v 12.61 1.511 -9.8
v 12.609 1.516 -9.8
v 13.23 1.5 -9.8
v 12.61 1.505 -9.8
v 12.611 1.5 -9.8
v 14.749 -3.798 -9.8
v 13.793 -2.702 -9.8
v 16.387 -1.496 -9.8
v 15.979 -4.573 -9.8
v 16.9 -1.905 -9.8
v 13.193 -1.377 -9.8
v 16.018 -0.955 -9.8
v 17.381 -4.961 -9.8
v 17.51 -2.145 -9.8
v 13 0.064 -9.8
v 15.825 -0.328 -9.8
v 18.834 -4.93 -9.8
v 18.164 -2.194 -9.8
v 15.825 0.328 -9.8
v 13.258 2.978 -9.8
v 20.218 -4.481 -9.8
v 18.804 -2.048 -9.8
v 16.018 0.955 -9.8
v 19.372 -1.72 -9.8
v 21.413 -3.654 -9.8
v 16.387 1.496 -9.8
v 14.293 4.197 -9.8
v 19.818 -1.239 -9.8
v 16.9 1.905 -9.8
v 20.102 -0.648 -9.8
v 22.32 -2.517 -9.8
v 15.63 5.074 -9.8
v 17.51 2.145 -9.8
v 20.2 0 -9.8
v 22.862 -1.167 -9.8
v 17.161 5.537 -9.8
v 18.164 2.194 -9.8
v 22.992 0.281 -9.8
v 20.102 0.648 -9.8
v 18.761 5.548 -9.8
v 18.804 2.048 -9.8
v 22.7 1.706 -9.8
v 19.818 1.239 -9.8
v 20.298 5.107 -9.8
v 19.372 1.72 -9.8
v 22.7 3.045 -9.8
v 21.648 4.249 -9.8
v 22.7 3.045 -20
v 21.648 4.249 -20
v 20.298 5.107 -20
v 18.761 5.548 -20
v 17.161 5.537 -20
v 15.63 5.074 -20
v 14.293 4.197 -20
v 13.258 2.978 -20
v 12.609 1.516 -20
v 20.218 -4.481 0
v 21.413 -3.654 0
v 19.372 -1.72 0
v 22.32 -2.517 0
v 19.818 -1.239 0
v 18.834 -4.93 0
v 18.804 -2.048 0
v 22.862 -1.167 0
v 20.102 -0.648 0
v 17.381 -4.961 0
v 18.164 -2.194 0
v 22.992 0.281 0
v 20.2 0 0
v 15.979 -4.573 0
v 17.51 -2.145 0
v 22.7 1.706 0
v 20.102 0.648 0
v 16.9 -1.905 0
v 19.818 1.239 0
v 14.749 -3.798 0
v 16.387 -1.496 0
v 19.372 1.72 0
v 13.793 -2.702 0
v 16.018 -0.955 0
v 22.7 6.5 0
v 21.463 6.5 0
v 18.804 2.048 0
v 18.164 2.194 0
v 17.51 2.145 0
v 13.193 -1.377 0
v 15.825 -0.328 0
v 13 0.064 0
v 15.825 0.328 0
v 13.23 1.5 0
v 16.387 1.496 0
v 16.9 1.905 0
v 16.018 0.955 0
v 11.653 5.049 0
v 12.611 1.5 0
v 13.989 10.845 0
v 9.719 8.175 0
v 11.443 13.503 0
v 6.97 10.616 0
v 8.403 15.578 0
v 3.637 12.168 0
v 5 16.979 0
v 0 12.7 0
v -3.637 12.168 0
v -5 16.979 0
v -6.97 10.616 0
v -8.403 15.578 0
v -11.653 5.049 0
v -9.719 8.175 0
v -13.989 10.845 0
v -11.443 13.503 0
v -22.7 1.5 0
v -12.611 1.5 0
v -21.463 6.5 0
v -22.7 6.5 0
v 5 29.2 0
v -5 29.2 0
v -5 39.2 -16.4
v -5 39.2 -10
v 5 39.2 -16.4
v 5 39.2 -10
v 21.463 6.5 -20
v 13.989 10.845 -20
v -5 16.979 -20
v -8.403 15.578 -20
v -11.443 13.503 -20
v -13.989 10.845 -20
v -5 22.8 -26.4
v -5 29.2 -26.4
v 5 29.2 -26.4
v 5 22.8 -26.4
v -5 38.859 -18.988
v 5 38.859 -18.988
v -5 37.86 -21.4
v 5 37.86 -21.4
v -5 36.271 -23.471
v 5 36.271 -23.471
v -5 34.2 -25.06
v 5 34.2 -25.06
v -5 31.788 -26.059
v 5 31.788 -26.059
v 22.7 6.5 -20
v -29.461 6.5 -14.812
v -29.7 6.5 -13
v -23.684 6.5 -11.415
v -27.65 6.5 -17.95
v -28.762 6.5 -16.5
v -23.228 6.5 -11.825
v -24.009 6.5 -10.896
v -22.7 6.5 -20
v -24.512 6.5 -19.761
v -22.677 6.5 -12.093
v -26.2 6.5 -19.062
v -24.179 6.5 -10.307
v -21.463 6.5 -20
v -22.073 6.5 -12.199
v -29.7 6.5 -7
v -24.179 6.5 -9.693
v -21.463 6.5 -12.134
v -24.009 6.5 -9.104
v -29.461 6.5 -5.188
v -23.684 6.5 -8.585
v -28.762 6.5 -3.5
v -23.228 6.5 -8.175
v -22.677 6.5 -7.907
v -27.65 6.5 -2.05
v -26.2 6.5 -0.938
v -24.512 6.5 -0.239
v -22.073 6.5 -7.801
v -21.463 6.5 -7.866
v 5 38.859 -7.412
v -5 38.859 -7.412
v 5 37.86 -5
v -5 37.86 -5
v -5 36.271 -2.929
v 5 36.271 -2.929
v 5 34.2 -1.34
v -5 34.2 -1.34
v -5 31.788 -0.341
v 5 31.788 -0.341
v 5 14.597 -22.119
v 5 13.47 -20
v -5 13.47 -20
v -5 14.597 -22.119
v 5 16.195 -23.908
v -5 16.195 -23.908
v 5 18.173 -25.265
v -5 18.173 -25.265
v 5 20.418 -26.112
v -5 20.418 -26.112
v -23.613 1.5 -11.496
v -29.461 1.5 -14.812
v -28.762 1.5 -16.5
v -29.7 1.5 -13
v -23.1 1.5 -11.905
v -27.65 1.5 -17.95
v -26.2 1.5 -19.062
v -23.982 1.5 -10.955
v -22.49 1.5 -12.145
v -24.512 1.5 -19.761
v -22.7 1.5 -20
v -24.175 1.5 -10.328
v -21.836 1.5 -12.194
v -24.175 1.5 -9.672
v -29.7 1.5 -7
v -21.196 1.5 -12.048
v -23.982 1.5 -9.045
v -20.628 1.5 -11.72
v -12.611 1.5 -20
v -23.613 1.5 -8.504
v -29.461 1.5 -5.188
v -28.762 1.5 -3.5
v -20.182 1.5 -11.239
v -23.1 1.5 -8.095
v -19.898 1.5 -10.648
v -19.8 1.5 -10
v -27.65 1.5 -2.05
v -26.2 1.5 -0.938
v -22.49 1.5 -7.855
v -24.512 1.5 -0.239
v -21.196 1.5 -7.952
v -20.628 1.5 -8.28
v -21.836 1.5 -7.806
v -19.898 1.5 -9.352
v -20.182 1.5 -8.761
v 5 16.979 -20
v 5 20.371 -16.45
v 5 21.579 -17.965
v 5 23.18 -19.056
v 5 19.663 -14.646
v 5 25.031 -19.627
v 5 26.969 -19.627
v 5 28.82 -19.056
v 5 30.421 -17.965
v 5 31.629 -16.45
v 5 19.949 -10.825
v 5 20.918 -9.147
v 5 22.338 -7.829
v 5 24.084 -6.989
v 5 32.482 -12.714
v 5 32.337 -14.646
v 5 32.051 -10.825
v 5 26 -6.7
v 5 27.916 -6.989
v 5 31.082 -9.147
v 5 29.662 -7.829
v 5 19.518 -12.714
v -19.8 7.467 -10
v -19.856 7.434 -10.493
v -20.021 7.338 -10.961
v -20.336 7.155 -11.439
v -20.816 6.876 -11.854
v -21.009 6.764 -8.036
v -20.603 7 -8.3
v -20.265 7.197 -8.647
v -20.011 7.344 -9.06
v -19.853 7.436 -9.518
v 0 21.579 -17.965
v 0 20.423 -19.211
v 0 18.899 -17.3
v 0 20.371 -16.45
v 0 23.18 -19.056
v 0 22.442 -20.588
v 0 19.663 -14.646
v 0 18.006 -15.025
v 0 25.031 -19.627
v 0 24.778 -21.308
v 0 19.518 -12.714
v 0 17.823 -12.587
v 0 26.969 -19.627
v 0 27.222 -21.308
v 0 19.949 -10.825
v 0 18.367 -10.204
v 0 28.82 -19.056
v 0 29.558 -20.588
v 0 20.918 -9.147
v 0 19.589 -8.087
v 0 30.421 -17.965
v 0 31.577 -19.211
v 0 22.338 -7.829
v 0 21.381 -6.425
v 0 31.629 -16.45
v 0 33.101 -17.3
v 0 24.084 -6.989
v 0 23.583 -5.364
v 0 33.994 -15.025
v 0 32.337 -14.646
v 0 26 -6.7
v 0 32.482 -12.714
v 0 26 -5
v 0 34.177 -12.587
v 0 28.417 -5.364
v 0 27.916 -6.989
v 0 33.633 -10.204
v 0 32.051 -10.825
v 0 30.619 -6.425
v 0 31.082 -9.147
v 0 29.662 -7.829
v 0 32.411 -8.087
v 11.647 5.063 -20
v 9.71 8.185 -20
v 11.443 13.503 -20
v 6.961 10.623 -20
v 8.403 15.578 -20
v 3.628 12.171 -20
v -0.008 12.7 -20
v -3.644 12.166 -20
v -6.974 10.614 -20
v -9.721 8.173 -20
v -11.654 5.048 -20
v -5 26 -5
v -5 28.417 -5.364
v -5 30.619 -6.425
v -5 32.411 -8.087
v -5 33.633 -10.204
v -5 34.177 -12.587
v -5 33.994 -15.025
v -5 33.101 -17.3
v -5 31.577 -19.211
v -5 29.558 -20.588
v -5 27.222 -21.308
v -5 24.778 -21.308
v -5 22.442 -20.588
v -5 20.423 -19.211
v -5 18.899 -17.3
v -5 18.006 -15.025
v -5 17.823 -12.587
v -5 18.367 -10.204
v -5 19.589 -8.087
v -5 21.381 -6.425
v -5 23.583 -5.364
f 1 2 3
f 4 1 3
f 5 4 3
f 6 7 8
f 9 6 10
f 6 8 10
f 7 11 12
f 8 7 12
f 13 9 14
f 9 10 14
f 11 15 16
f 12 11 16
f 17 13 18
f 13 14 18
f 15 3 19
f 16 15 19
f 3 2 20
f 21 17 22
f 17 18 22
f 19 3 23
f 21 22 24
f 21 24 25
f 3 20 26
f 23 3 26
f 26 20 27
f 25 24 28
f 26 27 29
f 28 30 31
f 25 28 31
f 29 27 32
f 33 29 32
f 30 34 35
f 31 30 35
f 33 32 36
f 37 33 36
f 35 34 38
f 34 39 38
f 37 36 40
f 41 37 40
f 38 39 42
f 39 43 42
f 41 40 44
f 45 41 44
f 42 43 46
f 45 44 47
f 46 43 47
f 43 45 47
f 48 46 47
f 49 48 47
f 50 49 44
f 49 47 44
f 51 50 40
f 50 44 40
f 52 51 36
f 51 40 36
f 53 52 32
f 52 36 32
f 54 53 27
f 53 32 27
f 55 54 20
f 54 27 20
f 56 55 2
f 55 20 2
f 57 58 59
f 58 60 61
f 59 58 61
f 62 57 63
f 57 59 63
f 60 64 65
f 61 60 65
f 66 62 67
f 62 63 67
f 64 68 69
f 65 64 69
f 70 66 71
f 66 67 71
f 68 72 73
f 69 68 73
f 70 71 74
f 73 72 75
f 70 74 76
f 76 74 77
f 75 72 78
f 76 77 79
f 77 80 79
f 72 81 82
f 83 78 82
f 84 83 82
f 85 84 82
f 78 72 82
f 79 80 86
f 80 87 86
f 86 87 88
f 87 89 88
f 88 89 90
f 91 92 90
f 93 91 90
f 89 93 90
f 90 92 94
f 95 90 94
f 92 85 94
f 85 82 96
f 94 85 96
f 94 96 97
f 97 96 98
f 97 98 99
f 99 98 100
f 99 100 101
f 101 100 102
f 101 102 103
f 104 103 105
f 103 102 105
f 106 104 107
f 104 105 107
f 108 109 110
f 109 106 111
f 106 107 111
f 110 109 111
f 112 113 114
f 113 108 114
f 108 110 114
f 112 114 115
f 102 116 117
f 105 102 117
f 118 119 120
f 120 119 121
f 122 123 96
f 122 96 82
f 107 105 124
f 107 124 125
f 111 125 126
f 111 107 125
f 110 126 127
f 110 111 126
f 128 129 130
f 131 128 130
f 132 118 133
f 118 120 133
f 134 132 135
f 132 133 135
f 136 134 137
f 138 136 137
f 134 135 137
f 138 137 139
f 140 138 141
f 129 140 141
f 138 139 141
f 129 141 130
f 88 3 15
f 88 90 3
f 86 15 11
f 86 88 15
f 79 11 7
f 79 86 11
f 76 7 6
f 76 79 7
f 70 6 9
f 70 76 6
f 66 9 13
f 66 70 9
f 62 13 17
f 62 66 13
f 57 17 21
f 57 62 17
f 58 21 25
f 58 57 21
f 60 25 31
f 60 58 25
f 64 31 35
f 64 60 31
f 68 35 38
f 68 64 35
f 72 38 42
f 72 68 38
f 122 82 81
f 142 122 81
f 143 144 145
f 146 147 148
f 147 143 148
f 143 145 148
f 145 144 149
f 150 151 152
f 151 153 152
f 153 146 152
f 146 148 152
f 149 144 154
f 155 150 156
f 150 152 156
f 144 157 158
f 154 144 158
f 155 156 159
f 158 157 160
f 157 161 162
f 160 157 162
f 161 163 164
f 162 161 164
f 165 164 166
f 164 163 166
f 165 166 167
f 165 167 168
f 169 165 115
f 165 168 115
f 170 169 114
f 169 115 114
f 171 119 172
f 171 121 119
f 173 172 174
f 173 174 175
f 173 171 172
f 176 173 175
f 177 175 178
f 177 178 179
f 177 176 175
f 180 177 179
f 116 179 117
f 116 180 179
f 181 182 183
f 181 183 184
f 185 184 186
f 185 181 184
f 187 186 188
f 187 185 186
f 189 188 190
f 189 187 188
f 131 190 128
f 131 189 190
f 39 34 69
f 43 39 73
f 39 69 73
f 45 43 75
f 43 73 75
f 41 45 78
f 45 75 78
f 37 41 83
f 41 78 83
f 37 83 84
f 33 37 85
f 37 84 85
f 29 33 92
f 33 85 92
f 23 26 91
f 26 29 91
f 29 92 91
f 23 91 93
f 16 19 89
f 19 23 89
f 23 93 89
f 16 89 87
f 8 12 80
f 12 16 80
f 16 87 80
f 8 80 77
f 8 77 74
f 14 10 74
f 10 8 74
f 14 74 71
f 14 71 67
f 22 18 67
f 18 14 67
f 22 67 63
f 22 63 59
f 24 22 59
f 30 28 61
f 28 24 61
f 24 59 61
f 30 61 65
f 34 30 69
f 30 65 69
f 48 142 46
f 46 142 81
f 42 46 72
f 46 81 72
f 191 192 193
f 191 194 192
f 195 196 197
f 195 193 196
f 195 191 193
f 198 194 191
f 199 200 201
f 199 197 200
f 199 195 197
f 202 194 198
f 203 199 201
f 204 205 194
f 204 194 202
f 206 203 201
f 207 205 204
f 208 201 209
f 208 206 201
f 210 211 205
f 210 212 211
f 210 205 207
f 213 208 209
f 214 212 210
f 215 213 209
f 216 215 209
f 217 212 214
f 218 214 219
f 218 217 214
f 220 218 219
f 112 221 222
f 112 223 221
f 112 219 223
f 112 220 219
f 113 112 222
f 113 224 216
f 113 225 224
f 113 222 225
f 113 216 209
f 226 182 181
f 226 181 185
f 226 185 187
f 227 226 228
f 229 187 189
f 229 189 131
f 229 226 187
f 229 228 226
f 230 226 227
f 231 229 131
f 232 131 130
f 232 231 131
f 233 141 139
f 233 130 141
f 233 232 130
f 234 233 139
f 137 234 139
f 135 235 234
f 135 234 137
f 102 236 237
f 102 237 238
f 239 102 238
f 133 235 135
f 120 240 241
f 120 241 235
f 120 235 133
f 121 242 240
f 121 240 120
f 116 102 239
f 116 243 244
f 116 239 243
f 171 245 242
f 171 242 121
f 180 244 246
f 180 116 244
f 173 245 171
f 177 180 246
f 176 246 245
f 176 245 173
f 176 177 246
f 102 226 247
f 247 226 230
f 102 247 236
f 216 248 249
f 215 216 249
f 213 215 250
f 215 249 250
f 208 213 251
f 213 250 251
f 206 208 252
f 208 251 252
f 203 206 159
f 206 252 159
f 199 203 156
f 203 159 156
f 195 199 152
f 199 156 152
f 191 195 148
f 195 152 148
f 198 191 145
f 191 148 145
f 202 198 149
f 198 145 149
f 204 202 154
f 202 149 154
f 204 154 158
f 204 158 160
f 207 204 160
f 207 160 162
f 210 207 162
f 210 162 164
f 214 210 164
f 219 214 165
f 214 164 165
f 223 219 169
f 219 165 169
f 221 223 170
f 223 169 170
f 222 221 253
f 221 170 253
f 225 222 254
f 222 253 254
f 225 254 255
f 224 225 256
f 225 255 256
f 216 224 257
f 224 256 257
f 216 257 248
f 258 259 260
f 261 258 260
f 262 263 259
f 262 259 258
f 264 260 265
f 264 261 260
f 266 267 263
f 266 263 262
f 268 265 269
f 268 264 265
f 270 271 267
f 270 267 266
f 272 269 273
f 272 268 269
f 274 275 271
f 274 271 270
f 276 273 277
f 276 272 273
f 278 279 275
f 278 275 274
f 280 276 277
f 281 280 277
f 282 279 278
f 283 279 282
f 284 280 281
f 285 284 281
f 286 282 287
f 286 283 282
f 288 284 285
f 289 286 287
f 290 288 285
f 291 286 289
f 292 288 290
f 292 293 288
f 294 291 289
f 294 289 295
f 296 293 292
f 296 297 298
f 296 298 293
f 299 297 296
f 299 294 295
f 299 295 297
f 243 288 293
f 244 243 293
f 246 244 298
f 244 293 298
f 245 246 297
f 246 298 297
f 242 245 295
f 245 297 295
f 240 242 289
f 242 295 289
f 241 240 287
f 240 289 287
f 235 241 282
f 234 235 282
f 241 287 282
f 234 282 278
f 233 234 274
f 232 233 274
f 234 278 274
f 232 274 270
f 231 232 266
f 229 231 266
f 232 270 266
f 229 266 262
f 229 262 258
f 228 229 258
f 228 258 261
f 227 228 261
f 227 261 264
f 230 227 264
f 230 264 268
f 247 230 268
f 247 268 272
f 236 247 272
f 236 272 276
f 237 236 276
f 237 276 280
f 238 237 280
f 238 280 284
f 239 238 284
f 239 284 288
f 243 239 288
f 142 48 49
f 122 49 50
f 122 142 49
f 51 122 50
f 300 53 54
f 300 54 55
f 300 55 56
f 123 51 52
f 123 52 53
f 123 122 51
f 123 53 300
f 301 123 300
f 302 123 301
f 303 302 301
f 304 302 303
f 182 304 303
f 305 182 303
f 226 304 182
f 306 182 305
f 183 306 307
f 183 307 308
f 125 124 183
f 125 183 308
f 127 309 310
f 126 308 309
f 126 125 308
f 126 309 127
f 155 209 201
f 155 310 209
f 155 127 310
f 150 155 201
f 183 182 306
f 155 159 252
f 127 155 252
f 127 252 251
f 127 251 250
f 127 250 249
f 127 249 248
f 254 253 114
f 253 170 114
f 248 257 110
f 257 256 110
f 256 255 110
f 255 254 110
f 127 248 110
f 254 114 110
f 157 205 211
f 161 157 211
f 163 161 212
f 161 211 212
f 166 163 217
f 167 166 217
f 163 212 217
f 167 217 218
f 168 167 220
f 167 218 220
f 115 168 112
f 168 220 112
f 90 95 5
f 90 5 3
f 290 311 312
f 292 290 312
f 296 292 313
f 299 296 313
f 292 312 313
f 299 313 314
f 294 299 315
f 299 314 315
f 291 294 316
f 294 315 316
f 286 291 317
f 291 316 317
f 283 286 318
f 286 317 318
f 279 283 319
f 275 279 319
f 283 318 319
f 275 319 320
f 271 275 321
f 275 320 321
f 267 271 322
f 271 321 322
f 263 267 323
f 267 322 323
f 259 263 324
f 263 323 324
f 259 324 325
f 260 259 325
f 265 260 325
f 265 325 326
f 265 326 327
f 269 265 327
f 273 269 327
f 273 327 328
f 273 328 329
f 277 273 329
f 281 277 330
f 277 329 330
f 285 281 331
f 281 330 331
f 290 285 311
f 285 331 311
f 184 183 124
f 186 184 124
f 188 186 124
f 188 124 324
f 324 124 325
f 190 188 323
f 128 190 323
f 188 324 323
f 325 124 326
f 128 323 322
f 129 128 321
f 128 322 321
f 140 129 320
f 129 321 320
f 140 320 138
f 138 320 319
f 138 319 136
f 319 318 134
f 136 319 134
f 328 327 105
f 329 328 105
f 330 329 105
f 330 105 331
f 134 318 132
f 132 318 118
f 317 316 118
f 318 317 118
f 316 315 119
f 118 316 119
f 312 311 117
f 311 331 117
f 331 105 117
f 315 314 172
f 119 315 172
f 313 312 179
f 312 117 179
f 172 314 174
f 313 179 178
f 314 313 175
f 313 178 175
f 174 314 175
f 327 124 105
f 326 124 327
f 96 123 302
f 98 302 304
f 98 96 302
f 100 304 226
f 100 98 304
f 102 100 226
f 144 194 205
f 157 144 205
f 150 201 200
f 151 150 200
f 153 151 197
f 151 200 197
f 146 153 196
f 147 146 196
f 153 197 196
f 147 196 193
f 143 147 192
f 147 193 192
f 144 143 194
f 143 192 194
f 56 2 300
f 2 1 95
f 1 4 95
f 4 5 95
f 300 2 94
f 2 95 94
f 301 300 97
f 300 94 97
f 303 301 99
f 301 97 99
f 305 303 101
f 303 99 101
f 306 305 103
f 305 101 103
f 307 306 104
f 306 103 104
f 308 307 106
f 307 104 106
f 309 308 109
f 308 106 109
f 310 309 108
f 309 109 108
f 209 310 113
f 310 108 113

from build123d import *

# Parameters (mm, degrees)
CYLINDER005_R     = 6.5
CYLINDER005_DEPTH = 10
CYLINDER004_R     = 8.2
CYLINDER004_DEPTH = 5
BOX_W             = 10
BOX_H             = 26.4
BOX_DEPTH         = 26.4
FILLET_R          = 10
CYLINDER010_R     = 5.6
CYLINDER010_DEPTH = 10.2
CYLINDER008_R     = 2.2
CYLINDER008_DEPTH = 20
CYLINDER002_R     = 2.2
CYLINDER002_DEPTH = 20
PAD_DEPTH         = 20
PAD001_DEPTH      = 5
CYLINDER009_R     = 5
CYLINDER009_DEPTH = 9.8


with BuildPart() as bring_holder_hole:
    # Cylinder005 → Cylinder005 (new body)
    with BuildSketch(Plane(origin=(0, 0, 0), x_dir=(0, 0, -1), z_dir=(1, 0, 0))):
        Circle(CYLINDER005_R)
    extrude(amount=CYLINDER005_DEPTH)


with BuildPart() as bring_holder_extract:
    # Cylinder004 → Cylinder004 (new body)
    with BuildSketch(Plane(origin=(0, 0, 0), x_dir=(0, 0, -1), z_dir=(1, 0, 0))):
        Circle(CYLINDER004_R)
    extrude(amount=CYLINDER004_DEPTH)

    # Fusion001: union bring holder hole
    add(bring_holder_hole.part)


with BuildPart() as bring_holder_cut:
    # Box → Box (new body)
    with BuildSketch(Plane(origin=(0, -13.2, -13.2), x_dir=(1, 0, 0), z_dir=(0, 0, 1))):
        with Locations((5, 13.2)):
            Rectangle(BOX_W, BOX_H)
    extrude(amount=BOX_DEPTH)

    # Fillet
    fillet_edges = [bring_holder_cut.edges().sort_by_distance(p)[0] for p in [
        (5, -13.2, 13.2),
        (5, 13.2, -13.2),
        (5, 13.2, 13.2),
    ]]
    fillet(fillet_edges, radius=FILLET_R)

    # Cut023015003: cut bring holder extract
    add(bring_holder_extract.part, mode=Mode.SUBTRACT)


with BuildPart() as bring_holder_cut_1:
    # Cut023015003 placement: moved
    add(bring_holder_cut.part.moved(Location((-5, 26, 13.2))))


with BuildPart() as horizontal_body_space:
    # Cylinder010 → Cylinder010 (new body)
    with BuildSketch(Plane(origin=(18, 0, 9.8), x_dir=(1, 0, 0), z_dir=(0, 0, 1))):
        Circle(CYLINDER010_R)
    extrude(amount=CYLINDER010_DEPTH)


with BuildPart() as horizontal_insert_hole:
    # Cylinder008 → Cylinder008 (new body)
    with BuildSketch(Plane(origin=(18, 0, 0), x_dir=(1, 0, 0), z_dir=(0, 0, 1))):
        Circle(CYLINDER008_R)
    extrude(amount=CYLINDER008_DEPTH)


with BuildPart() as f_25_mm_attachment_extract:
    # Cylinder002 → Cylinder002 (new body)
    with BuildSketch(Plane(origin=(-22, 20, 10), x_dir=(1, 0, 0), z_dir=(0, -1, 0))):
        Circle(CYLINDER002_R)
    extrude(amount=CYLINDER002_DEPTH)

    # Fusion007: union horizontal body space, horizontal insert hole
    add(horizontal_body_space.part)
    add(horizontal_insert_hole.part)


with BuildPart() as f_25_mm_attachment_body:
    # Sketch → Pad (new body)
    with BuildSketch(Plane.XY):
        with BuildLine():
            ThreePointArc((12.611106, 1.5), (0, 12.7), (-12.611106, 1.5))
            Line((-22.7, 1.5), (-12.611106, 1.5))
            Line((-22.7, 1.5), (-22.7, 6.5))
            Line((-22.7, 6.5), (-21.463293, 6.5))
            Line((-21.463293, 6.5), (-13.988671, 10.84468))
            ThreePointArc((13.988671, 10.84468), (0, 17.7), (-13.988671, 10.84468))
            Line((13.988671, 10.84468), (21.463293, 6.5))
            Line((21.463293, 6.5), (22.7, 6.5))
            Line((22.7, 6.5), (22.7, 1.5))
            Line((12.611106, 1.5), (22.7, 1.5))
        make_face()
    extrude(amount=PAD_DEPTH)

    # Sketch001 → Pad001 (join)
    with BuildSketch(Plane.XZ.offset(-1.5)):
        with BuildLine():
            Line((-12.611106, 20), (-22.7, 20))
            ThreePointArc((-22.7, 20), (-27.649747, 17.949747), (-29.7, 13))
            Line((-29.7, 13), (-29.7, 7))
            ThreePointArc((-29.7, 7), (-27.649747, 2.050253), (-22.7, 0))
            Line((-12.611106, 0), (-22.7, 0))
            Line((-12.611106, 20), (-12.611106, 0))
        make_face()
    extrude(amount=-PAD001_DEPTH)


with BuildPart() as f_25_mm_16mm_bring_attachment_fusion:
    # Cylinder009 → Cylinder009 (new body)
    with BuildSketch(Plane(origin=(18, 0, 0), x_dir=(1, 0, 0), z_dir=(0, 0, 1))):
        Circle(CYLINDER009_R)
    extrude(amount=CYLINDER009_DEPTH)

    # Fusion006: union 25 mm attachment body
    add(f_25_mm_attachment_body.part)

    # Cut023015002: cut 25 mm attachment extract
    add(f_25_mm_attachment_extract.part, mode=Mode.SUBTRACT)

    # Fusion002: union bring holder cut
    add(bring_holder_cut_1.part)


with BuildPart() as part_mirroring003:
    # Part__Mirroring003: instance of 25 mm 16mm bring attachment fusion
    add(f_25_mm_16mm_bring_attachment_fusion.part.mirror(Plane(origin=(0, 0, 0), x_dir=(0, 1, 0), z_dir=(0, 0, 1))))


solid = part_mirroring003.part
